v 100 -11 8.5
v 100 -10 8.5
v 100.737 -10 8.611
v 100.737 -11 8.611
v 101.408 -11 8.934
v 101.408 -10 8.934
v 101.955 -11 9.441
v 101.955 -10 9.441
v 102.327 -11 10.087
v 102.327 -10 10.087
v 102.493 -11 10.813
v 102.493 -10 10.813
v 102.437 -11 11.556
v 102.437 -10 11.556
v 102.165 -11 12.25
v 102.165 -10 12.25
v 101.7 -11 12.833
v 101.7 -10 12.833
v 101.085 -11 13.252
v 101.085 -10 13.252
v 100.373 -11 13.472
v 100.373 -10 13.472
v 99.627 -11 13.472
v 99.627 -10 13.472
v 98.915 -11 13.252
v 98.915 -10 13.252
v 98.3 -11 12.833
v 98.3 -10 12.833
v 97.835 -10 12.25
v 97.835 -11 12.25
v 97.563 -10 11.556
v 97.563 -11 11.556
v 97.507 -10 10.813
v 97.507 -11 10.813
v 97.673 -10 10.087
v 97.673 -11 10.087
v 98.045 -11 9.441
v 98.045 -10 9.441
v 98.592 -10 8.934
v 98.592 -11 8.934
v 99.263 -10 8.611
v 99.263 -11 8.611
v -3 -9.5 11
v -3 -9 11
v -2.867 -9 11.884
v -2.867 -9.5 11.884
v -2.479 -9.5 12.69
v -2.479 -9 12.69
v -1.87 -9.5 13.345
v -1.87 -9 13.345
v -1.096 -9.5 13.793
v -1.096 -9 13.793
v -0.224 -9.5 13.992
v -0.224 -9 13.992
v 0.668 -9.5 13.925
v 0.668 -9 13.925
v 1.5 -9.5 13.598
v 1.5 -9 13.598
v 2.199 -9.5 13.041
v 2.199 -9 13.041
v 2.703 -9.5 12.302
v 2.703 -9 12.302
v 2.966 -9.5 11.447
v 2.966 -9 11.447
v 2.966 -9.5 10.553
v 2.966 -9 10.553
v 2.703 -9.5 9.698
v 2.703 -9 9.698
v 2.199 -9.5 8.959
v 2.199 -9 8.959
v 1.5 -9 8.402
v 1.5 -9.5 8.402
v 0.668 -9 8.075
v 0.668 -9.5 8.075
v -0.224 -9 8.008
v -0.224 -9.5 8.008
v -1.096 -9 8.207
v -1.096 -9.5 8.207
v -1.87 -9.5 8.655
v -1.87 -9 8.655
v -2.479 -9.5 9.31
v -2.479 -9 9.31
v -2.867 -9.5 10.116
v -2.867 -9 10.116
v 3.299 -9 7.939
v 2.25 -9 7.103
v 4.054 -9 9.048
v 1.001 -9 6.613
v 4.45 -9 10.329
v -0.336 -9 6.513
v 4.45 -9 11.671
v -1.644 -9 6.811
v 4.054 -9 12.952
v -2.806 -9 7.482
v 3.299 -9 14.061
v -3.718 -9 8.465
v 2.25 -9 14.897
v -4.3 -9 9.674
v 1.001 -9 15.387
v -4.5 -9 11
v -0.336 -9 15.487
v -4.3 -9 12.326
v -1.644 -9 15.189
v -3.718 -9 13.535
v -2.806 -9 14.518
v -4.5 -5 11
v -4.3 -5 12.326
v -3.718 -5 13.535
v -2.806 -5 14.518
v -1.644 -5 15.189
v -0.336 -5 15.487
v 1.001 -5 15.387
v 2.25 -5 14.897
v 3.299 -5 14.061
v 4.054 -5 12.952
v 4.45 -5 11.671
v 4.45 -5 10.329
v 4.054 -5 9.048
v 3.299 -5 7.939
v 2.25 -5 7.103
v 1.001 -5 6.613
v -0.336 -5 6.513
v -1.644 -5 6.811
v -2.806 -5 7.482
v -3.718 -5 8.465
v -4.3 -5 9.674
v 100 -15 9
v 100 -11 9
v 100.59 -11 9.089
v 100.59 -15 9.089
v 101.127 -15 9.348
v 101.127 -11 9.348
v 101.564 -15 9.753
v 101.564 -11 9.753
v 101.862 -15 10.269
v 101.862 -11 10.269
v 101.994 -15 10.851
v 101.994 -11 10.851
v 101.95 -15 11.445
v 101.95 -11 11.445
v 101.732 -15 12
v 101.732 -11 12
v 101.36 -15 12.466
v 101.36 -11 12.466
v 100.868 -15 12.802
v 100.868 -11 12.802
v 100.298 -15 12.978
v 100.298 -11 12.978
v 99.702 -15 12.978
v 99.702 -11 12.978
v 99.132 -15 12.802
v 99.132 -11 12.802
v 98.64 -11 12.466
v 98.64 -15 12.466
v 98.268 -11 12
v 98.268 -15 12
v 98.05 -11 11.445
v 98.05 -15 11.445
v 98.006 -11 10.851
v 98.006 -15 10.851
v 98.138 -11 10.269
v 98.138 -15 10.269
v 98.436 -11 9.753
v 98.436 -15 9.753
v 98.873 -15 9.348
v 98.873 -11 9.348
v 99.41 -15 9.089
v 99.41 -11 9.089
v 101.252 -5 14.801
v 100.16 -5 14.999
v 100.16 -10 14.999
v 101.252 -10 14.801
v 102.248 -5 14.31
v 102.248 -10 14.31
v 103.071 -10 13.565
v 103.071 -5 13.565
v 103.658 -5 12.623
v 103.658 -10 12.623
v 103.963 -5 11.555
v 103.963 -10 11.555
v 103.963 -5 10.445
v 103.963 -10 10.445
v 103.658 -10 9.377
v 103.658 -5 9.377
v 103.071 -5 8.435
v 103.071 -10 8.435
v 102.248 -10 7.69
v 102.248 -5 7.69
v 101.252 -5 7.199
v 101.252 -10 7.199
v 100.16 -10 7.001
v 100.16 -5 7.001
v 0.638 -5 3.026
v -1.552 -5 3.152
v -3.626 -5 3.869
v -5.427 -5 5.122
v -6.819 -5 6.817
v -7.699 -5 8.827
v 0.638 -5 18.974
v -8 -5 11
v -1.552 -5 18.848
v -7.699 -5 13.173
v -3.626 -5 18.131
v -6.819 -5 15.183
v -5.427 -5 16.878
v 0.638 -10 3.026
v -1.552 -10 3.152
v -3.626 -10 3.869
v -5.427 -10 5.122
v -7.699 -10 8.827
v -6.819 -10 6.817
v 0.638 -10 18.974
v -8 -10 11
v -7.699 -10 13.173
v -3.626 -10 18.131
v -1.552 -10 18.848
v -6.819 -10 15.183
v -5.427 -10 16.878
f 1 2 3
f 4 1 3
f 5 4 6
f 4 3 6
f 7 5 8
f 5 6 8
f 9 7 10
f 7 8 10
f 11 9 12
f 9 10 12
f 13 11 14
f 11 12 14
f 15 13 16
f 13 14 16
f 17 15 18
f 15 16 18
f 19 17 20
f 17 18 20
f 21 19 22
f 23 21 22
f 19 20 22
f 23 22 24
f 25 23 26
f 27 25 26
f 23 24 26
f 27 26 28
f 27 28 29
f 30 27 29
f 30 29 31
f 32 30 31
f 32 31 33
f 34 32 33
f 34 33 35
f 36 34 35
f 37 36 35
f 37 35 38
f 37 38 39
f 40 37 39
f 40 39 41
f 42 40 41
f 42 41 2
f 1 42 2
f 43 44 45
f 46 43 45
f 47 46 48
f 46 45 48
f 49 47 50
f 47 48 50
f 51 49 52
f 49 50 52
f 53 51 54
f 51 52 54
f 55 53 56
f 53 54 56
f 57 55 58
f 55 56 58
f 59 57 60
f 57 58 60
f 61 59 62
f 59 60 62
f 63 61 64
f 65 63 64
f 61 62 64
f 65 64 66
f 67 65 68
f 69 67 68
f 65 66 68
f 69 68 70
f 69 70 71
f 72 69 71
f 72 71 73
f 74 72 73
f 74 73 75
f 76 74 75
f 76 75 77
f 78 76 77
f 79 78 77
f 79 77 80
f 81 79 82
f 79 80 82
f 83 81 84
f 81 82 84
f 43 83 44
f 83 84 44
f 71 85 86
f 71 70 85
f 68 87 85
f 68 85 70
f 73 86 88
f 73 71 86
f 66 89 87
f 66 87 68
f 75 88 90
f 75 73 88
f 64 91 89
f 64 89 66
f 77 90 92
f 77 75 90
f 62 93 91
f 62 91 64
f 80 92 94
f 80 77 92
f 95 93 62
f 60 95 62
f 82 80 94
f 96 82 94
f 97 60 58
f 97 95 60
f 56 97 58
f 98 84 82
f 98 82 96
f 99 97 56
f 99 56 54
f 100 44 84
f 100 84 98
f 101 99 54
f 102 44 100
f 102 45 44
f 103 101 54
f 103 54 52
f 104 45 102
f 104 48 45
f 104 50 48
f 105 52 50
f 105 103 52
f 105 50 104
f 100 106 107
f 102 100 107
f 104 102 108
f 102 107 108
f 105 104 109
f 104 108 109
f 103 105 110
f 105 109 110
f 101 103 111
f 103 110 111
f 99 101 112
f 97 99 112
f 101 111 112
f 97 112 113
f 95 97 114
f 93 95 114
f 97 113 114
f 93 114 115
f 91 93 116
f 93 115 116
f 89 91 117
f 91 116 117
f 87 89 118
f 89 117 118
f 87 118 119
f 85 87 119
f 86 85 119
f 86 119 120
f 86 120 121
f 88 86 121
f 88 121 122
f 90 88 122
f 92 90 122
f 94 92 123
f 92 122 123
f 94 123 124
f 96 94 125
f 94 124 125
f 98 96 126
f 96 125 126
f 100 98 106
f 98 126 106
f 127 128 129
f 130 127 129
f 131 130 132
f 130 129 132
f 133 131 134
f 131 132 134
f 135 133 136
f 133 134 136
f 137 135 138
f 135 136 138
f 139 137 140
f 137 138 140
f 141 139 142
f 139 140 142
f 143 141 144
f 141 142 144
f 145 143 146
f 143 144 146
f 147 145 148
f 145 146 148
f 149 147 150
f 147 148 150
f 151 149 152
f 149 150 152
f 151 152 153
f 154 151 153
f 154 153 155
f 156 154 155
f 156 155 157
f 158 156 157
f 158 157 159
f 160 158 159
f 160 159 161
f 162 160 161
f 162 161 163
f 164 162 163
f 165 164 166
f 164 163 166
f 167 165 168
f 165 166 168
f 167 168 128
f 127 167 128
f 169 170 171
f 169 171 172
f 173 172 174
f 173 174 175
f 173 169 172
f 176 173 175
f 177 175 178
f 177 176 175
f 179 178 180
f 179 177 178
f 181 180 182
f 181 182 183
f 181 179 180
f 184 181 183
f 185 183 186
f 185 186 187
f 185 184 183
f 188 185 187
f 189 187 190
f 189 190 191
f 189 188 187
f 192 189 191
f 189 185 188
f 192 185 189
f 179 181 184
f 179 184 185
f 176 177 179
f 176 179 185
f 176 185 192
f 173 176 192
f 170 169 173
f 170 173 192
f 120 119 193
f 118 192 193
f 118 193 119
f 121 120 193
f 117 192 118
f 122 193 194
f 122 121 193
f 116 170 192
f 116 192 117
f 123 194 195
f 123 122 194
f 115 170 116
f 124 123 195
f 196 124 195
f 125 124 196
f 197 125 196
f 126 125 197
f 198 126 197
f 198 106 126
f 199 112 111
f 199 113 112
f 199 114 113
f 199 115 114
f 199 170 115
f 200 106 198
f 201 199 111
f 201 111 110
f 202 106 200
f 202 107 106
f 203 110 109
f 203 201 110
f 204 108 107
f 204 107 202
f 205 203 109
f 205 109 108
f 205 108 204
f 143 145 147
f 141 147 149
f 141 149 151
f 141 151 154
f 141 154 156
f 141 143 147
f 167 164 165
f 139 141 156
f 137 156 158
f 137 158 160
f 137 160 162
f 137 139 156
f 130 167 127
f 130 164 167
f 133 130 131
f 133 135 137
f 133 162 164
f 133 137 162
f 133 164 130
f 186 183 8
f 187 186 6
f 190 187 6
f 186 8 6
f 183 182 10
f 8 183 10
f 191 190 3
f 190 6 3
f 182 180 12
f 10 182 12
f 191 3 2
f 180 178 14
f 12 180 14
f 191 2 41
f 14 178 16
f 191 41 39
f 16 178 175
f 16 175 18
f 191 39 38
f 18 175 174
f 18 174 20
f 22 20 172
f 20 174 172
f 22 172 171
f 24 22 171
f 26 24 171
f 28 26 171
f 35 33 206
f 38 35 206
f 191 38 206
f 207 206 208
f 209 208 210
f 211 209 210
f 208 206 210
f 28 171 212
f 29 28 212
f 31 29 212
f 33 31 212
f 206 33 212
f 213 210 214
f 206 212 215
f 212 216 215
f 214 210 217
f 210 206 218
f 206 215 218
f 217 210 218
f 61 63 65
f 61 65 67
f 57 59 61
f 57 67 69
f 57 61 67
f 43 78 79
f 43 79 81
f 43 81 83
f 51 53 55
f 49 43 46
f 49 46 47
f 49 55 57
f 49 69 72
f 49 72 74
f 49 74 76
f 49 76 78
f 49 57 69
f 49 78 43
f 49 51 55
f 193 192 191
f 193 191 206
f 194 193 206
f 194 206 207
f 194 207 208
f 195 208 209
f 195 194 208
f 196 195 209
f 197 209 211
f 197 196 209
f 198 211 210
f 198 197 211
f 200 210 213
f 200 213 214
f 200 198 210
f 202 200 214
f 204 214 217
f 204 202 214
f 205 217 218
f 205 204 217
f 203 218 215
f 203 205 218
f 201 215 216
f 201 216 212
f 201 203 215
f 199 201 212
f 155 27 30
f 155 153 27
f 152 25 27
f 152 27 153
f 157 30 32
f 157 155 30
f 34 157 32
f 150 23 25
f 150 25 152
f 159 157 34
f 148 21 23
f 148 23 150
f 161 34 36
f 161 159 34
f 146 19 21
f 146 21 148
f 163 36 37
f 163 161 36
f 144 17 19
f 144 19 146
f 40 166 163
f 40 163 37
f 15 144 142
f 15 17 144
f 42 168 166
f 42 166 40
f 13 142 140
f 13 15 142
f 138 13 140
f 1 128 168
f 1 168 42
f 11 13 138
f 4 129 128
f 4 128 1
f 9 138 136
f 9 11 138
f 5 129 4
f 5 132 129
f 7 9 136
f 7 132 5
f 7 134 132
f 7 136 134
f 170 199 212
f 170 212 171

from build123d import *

# Parameters (mm, degrees)
BOSS_EXTRUDE1_DEPTH   = 5
SKETCH2_R             = 4.5
CUT_EXTRUDE1_DEPTH    = 4
SKETCH7_R             = 3
CUT_EXTRUDE3_DEPTH    = 0.5
BODY_MOVE_COPY1_ANGLE = 90
BODY_MOVE_COPY2_ANGLE = 180
SKETCH8_R             = 2.5
BOSS_EXTRUDE2_DEPTH   = 5
CUT_EXTRUDE4_START    = -4
SKETCH9_R             = 2.5
SKETCH9_R_2           = 2
CUT_EXTRUDE4_DEPTH    = 4


with BuildPart() as part:
    # Sketch1 → Boss-Extrude1 (new body)
    with BuildSketch(Plane.XY):
        with BuildLine():
            Line((100.159744623, 3.998531964), (0.638194143, 7.974499314))
            ThreePointArc((0.638194143, 7.974499314), (-7.999995692, 0), (0.638194143, -7.974499314))
            Line((0.638194143, -7.974499314), (100.159744623, -3.998531964))
            ThreePointArc((100.159744623, -3.998531964), (104.001721656, 0), (100.159744623, 3.998531964))
        make_face()
    extrude(amount=BOSS_EXTRUDE1_DEPTH)

    # Sketch2 → Cut-Extrude1 (cut)
    with BuildSketch(Plane(origin=(0, 0, 0), x_dir=(-1, 0, 0), z_dir=(0, 0, -1))):
        Circle(SKETCH2_R)
    extrude(amount=-CUT_EXTRUDE1_DEPTH, mode=Mode.SUBTRACT)

    # Sketch7 → Cut-Extrude3 (cut)
    with BuildSketch(Plane(origin=(0, 0, 4), x_dir=(-1, 0, 0), z_dir=(0, 0, -1))):
        Circle(SKETCH7_R)
    extrude(amount=-CUT_EXTRUDE3_DEPTH, mode=Mode.SUBTRACT)


with BuildPart() as part_1:
    # Body-Move/Copy1: moved
    add(part.part.rotate(Axis((0, 0, 11), (-1, 0, 0)), BODY_MOVE_COPY1_ANGLE))


with BuildPart() as part_2:
    # Body-Move/Copy2: moved
    add(part_1.part.rotate(Axis((0, -8, 11), (1, 0, 0)), BODY_MOVE_COPY2_ANGLE))

    # Sketch8 → Boss-Extrude2 (add)
    with BuildSketch(Plane.XZ.offset(10)):
        with Locations((100, 11)):
            Circle(SKETCH8_R)
    extrude(amount=BOSS_EXTRUDE2_DEPTH)

    # Sketch9 → Cut-Extrude4 (cut)
    with BuildSketch(Plane.XZ.offset(15).offset(CUT_EXTRUDE4_START)):
        with Locations((100, 11)):
            Circle(SKETCH9_R)
        with Locations((100, 11)):
            Circle(SKETCH9_R_2, mode=Mode.SUBTRACT)
    extrude(amount=CUT_EXTRUDE4_DEPTH, mode=Mode.SUBTRACT)


solid = part_2.part
